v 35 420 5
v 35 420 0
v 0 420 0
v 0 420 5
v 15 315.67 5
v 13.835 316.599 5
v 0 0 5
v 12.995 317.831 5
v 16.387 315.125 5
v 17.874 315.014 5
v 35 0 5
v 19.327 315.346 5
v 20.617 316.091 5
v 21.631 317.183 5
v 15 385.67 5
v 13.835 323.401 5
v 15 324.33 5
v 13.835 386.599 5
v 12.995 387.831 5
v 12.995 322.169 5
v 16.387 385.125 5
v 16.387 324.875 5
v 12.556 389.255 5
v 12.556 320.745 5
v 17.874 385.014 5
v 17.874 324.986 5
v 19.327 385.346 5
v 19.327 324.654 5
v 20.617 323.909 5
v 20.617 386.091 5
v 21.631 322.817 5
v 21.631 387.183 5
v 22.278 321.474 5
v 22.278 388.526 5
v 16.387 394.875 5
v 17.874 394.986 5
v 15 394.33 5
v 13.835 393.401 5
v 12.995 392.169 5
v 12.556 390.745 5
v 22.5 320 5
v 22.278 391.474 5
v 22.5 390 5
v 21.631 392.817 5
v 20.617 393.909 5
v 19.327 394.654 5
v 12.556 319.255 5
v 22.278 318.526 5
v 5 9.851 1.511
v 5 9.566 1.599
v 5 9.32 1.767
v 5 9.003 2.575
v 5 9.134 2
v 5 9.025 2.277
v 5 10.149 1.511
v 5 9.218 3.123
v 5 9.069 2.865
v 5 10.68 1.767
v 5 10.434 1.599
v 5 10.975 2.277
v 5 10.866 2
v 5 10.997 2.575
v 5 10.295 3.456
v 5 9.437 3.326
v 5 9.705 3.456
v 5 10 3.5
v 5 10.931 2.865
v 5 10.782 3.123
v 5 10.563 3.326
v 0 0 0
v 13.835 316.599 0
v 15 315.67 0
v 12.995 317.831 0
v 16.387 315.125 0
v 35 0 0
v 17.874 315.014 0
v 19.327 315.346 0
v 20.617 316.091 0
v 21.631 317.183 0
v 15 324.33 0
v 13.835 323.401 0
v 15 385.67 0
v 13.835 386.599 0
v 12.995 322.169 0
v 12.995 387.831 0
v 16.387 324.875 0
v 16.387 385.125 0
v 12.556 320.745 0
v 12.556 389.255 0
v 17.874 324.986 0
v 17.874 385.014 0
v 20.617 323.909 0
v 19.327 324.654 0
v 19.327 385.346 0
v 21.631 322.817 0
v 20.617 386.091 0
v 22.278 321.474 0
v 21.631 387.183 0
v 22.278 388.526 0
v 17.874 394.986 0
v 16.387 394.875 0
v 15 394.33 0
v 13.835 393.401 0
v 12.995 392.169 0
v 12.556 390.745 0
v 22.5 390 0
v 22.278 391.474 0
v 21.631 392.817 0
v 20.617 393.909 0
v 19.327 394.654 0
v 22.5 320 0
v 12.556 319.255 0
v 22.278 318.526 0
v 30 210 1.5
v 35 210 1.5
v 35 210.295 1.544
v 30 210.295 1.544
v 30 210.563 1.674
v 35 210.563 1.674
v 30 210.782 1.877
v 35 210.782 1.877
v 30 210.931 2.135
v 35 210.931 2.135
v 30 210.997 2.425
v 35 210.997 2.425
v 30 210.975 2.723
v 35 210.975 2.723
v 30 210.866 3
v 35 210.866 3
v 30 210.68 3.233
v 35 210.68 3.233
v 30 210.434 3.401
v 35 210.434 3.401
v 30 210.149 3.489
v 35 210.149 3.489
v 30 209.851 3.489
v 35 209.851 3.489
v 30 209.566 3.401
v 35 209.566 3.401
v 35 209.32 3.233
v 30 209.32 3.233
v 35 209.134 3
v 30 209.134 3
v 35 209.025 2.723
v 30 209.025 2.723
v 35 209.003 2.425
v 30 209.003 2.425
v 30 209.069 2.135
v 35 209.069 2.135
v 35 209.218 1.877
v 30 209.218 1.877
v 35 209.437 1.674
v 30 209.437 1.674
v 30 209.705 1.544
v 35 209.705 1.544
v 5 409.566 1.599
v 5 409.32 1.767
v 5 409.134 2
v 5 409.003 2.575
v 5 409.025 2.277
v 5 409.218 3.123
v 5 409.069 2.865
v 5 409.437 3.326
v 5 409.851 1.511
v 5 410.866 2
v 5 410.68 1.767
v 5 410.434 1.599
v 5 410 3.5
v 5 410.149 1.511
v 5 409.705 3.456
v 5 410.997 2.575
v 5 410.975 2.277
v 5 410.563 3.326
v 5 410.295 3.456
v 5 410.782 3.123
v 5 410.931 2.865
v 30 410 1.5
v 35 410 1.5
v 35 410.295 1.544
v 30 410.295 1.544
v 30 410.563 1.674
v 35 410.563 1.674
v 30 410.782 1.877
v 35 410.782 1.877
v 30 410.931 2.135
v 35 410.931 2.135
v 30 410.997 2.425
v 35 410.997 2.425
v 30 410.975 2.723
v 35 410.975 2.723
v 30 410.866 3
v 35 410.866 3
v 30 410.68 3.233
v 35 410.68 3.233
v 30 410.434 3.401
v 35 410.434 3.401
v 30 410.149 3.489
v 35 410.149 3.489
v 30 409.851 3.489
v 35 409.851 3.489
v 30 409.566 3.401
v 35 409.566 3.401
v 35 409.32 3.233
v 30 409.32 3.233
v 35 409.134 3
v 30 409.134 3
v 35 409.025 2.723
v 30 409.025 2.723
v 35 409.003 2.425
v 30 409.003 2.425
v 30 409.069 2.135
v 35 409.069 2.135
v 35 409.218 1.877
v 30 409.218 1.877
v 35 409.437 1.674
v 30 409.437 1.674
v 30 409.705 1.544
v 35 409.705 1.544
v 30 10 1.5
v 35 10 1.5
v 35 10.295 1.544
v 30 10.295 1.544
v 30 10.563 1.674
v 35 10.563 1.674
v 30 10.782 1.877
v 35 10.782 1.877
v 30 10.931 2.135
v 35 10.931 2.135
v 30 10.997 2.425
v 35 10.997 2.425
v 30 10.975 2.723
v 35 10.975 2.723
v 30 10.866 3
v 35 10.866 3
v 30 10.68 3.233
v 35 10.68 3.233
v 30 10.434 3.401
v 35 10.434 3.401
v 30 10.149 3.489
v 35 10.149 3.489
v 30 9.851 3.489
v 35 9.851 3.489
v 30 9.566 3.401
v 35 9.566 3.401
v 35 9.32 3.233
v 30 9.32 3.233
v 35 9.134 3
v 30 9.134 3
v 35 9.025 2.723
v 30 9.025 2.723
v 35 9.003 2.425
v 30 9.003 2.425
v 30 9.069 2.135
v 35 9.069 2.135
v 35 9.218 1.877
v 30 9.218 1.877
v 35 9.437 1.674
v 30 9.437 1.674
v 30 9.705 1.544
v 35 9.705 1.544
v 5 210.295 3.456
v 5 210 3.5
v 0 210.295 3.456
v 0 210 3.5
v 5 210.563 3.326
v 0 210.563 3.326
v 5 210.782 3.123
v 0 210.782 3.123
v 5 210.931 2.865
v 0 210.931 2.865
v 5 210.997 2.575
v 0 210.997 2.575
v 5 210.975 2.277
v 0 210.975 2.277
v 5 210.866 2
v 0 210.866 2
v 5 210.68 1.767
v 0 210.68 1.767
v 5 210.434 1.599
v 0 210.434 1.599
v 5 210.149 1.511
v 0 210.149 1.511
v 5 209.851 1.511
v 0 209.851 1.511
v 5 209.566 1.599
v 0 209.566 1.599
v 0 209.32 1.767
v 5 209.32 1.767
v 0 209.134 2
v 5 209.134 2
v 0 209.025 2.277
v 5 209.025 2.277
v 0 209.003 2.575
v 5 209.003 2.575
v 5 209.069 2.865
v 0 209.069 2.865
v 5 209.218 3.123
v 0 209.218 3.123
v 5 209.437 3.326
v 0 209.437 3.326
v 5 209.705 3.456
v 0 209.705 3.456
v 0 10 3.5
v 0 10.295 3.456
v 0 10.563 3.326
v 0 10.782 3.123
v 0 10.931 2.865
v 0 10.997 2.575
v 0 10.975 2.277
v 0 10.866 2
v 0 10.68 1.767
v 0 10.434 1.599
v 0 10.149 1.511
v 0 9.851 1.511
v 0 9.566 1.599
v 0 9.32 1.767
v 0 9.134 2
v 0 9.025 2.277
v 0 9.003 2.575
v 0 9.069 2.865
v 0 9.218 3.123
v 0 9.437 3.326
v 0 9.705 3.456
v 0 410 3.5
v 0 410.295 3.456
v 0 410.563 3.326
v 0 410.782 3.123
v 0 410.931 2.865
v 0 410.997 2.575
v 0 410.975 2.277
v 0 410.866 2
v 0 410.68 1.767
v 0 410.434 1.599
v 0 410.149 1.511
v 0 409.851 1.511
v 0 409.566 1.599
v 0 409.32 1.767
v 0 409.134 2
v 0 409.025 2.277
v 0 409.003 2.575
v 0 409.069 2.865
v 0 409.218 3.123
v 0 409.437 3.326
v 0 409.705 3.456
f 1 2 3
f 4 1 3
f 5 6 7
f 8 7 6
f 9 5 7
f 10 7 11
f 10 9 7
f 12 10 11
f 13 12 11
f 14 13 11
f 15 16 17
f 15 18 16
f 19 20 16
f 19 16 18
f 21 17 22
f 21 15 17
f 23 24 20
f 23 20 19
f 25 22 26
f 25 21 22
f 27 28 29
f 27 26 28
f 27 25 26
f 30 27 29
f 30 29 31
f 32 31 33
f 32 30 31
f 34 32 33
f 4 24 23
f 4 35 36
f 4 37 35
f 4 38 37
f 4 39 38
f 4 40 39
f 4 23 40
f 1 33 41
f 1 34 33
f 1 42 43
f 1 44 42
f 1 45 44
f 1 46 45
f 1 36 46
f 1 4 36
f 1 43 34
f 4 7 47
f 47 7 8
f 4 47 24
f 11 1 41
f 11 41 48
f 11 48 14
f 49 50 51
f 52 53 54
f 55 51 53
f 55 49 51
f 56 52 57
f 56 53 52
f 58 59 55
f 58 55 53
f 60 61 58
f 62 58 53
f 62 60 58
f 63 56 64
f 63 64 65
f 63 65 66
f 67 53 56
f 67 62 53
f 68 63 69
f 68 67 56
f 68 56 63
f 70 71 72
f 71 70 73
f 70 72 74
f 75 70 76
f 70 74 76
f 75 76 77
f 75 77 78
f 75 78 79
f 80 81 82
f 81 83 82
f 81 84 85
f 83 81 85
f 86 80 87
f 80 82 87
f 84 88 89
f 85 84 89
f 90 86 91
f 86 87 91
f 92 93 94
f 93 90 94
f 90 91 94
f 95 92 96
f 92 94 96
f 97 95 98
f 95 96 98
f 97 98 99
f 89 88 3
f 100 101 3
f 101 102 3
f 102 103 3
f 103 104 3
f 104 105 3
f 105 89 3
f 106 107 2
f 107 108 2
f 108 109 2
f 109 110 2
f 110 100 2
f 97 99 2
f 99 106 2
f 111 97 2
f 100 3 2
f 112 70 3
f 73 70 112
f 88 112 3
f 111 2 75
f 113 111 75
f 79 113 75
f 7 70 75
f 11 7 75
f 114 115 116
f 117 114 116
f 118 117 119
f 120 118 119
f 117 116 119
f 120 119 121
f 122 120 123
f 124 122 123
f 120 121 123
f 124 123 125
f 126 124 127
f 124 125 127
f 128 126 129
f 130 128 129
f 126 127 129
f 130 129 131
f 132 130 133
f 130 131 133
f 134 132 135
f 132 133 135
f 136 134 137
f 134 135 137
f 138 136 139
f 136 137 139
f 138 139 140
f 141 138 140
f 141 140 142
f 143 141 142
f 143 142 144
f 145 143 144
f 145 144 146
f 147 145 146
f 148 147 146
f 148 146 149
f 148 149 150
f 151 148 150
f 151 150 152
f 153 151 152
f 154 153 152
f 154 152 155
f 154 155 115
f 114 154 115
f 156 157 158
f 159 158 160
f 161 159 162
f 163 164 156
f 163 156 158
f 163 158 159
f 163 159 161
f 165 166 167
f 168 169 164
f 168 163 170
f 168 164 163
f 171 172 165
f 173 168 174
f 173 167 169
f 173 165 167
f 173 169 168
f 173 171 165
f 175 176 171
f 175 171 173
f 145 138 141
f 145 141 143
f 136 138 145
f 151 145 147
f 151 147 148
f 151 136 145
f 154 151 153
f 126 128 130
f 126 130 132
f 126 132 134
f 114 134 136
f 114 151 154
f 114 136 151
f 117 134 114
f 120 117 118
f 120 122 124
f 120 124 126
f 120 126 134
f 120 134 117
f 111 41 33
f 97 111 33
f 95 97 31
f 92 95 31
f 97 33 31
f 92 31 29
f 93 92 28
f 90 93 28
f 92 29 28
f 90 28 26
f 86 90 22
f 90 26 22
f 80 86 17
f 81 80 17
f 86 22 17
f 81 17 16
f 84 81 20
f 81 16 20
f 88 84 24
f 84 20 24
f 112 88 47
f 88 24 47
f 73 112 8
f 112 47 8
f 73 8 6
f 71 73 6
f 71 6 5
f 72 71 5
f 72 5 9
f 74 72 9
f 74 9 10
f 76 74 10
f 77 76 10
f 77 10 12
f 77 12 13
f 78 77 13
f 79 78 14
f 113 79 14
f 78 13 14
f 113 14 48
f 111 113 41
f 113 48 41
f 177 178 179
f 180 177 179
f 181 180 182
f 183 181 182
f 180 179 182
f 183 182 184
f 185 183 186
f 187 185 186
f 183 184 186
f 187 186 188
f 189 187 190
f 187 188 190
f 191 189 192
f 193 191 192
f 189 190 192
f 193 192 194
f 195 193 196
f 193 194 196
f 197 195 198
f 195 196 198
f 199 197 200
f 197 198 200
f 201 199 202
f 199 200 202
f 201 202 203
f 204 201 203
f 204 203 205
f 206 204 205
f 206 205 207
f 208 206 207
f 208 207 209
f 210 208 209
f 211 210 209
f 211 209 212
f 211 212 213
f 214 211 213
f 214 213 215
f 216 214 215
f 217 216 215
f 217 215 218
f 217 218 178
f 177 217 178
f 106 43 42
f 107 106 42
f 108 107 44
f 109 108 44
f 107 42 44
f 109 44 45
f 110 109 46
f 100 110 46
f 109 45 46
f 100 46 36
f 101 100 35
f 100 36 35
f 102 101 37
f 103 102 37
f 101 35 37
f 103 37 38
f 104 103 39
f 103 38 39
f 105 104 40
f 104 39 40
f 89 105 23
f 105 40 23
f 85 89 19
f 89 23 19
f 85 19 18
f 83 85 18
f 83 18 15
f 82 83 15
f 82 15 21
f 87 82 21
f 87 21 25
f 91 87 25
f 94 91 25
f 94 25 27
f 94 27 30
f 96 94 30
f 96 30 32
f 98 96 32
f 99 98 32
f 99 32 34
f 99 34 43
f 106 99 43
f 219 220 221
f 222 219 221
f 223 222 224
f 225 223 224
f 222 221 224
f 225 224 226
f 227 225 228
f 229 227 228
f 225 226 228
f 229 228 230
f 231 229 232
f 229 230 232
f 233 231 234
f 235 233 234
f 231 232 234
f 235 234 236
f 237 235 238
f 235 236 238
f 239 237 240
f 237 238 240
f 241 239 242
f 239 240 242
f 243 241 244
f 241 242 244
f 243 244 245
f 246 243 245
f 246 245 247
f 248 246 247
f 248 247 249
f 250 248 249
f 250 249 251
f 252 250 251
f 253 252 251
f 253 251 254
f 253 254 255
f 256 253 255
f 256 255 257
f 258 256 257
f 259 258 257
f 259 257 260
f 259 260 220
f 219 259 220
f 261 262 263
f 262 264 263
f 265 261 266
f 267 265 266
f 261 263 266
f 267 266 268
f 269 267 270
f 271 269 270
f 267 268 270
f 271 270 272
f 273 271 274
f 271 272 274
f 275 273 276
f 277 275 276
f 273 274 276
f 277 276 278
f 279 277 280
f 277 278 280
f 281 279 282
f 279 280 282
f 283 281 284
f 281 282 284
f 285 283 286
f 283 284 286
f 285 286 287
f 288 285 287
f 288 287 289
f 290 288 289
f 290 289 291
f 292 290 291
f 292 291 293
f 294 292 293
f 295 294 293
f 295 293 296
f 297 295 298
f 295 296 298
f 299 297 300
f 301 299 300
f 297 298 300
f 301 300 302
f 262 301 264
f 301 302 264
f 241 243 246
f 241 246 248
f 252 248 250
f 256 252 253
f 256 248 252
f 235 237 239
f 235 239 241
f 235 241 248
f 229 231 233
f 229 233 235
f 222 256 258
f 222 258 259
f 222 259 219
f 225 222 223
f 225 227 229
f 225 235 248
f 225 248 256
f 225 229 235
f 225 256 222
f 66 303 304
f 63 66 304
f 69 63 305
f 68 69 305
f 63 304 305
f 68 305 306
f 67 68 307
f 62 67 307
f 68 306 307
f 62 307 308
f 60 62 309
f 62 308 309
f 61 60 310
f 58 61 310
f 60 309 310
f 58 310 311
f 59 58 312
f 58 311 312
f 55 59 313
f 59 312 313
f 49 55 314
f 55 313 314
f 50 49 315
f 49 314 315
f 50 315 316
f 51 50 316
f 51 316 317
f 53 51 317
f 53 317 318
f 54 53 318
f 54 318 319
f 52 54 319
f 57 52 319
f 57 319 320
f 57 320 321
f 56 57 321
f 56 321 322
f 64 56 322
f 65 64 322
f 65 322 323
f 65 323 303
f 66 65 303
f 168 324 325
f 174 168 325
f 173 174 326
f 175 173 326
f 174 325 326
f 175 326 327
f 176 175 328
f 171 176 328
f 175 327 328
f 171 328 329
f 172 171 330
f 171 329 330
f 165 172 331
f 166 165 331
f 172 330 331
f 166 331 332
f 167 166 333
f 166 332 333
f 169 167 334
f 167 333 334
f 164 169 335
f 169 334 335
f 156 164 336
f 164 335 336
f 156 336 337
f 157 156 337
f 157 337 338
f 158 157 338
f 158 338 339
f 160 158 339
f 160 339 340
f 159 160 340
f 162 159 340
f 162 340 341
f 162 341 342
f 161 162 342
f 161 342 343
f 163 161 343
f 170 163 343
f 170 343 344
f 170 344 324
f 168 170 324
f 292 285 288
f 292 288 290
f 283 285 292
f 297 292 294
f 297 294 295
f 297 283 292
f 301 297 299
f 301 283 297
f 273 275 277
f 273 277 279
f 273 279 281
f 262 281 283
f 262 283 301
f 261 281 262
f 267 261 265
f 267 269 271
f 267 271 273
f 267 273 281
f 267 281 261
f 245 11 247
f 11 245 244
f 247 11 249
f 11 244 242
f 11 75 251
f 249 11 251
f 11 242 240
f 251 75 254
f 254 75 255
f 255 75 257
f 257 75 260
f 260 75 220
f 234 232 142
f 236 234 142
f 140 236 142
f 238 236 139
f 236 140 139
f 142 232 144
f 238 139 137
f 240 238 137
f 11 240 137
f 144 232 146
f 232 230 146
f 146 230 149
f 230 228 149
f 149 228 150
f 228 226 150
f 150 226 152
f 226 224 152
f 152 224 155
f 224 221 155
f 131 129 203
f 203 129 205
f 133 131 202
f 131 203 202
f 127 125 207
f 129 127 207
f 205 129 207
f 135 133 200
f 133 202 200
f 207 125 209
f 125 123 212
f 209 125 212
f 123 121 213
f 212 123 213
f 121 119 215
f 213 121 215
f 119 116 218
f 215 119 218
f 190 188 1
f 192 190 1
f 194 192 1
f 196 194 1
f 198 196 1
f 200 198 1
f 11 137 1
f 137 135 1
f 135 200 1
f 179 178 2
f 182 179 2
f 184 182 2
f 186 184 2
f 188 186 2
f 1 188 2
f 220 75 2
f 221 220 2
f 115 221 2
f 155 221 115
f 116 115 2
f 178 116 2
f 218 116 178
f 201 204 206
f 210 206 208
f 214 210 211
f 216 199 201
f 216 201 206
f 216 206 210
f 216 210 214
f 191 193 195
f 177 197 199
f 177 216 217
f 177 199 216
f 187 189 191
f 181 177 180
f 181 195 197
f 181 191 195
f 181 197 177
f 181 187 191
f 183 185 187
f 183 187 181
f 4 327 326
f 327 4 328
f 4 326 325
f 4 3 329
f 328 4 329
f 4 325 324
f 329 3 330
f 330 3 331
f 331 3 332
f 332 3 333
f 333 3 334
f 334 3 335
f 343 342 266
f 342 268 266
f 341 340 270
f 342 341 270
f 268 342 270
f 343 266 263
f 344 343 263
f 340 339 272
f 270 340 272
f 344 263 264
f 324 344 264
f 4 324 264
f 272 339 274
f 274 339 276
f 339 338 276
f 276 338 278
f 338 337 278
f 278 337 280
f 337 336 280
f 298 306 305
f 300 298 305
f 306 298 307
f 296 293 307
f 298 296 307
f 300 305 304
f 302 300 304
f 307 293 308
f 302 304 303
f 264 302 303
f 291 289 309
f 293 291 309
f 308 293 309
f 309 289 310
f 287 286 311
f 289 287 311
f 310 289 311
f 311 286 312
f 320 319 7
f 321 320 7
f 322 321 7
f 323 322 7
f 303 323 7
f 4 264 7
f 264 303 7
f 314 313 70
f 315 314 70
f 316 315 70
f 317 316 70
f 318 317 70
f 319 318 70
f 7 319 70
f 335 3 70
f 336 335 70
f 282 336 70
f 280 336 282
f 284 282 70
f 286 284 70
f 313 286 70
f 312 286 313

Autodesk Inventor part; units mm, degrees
ref_plane "YZ Plane" through (0, 0, 0) normal (1, 0, 0) x (0, 1, 0)
ref_plane "XZ Plane" through (0, 0, 0) normal (0, 1, 0) x (-1, 0, 0)
ref_plane "XY Plane" through (0, 0, 0) normal (0, 0, 1) x (1, 0, 0)
sketch "Sketch1" plane through (0, 0, 0) normal (0, 0, 1) x (1, 0, 0)
  line L0 (0, 0) -> (35, 0)
  line L1 (35, 0) -> (35, 420)
  line L2 (35, 420) -> (0, 420)
  line L3 (0, 420) -> (0, 0)
  dimension "d0" = 35
  dimension "d1" = 420
extrude "Extrusion1" add sketch "Sketch1" along normal blind 5
sketch "Sketch2" plane through (35, 0, 0) normal (1, 0, 0) x (0, 0, -1)
  circle A0 centre (-2.5, 410) radius 1
  circle A1 centre (-2.5, 210) radius 1
  circle A2 centre (-2.5, 10) radius 1
  line L0 (-5, 0) -> (-5, 420) projected
  line L1 (0, 420) -> (-5, 420) projected
  point P0 (0, 0)
  dimension "d4" = 2
  dimension "d5" = 2
  dimension "d6" = 2
  dimension "d7" = 2.5
  dimension "d8" = 2.5
  dimension "d9" = 2.5
  dimension "d10" = 10
  dimension "d11" = 210
  dimension "d12" = 410
extrude "Extrusion2" cut sketch "Sketch2" against normal blind 5
sketch "Sketch3" plane through (0, 0, 0) normal (-1, 0, 0) x (0, 0, 1)
  circle A0 centre (2.5, 10) radius 1
  circle A1 centre (2.5, 210) radius 1
  circle A2 centre (2.5, 410) radius 1
  line L0 (0, 420) -> (0, 0) projected
  line L1 (0, 420) -> (5, 420) projected
  dimension "d15" = 2
  dimension "d16" = 2.5
  dimension "d17" = 10
  dimension "d18" = 2
  dimension "d19" = 2.5
  dimension "d20" = 210
  dimension "d21" = 2
  dimension "d22" = 2.5
  dimension "d23" = 410
extrude "Extrusion3" cut sketch "Sketch3" against normal blind 5
sketch "Skizze4" plane through (0, 0, 5) normal (0, 0, 1) x (1, 0, 0)
  circle A0 centre (17.5, 320) radius 5
  circle A1 centre (17.5, 390) radius 5
  line L0 (0, 420) -> (0, 0) projected
  line L1 (0, 0) -> (35, 0) projected
  line L2 (35, 420) -> (0, 420) projected
  line L3 (17.5, 420) -> (17.5, 320) construction
  dimension "d26" = 17.5
  dimension "d27" = 17.5
  dimension "d29" = 70
  dimension "d32" = 30
  dimension "d33" = 10
extrude "Extrusion4" cut sketch "Skizze4" against normal blind 35
equation "\"d29\" = VerticalDistance"
equation "\"d30\" = d28"
equation "\"VerticalDistance\" = 70"
equation "\"d28\" = 35"
properties part number "Side plate profile" material "Acetalharz, Weiß"
